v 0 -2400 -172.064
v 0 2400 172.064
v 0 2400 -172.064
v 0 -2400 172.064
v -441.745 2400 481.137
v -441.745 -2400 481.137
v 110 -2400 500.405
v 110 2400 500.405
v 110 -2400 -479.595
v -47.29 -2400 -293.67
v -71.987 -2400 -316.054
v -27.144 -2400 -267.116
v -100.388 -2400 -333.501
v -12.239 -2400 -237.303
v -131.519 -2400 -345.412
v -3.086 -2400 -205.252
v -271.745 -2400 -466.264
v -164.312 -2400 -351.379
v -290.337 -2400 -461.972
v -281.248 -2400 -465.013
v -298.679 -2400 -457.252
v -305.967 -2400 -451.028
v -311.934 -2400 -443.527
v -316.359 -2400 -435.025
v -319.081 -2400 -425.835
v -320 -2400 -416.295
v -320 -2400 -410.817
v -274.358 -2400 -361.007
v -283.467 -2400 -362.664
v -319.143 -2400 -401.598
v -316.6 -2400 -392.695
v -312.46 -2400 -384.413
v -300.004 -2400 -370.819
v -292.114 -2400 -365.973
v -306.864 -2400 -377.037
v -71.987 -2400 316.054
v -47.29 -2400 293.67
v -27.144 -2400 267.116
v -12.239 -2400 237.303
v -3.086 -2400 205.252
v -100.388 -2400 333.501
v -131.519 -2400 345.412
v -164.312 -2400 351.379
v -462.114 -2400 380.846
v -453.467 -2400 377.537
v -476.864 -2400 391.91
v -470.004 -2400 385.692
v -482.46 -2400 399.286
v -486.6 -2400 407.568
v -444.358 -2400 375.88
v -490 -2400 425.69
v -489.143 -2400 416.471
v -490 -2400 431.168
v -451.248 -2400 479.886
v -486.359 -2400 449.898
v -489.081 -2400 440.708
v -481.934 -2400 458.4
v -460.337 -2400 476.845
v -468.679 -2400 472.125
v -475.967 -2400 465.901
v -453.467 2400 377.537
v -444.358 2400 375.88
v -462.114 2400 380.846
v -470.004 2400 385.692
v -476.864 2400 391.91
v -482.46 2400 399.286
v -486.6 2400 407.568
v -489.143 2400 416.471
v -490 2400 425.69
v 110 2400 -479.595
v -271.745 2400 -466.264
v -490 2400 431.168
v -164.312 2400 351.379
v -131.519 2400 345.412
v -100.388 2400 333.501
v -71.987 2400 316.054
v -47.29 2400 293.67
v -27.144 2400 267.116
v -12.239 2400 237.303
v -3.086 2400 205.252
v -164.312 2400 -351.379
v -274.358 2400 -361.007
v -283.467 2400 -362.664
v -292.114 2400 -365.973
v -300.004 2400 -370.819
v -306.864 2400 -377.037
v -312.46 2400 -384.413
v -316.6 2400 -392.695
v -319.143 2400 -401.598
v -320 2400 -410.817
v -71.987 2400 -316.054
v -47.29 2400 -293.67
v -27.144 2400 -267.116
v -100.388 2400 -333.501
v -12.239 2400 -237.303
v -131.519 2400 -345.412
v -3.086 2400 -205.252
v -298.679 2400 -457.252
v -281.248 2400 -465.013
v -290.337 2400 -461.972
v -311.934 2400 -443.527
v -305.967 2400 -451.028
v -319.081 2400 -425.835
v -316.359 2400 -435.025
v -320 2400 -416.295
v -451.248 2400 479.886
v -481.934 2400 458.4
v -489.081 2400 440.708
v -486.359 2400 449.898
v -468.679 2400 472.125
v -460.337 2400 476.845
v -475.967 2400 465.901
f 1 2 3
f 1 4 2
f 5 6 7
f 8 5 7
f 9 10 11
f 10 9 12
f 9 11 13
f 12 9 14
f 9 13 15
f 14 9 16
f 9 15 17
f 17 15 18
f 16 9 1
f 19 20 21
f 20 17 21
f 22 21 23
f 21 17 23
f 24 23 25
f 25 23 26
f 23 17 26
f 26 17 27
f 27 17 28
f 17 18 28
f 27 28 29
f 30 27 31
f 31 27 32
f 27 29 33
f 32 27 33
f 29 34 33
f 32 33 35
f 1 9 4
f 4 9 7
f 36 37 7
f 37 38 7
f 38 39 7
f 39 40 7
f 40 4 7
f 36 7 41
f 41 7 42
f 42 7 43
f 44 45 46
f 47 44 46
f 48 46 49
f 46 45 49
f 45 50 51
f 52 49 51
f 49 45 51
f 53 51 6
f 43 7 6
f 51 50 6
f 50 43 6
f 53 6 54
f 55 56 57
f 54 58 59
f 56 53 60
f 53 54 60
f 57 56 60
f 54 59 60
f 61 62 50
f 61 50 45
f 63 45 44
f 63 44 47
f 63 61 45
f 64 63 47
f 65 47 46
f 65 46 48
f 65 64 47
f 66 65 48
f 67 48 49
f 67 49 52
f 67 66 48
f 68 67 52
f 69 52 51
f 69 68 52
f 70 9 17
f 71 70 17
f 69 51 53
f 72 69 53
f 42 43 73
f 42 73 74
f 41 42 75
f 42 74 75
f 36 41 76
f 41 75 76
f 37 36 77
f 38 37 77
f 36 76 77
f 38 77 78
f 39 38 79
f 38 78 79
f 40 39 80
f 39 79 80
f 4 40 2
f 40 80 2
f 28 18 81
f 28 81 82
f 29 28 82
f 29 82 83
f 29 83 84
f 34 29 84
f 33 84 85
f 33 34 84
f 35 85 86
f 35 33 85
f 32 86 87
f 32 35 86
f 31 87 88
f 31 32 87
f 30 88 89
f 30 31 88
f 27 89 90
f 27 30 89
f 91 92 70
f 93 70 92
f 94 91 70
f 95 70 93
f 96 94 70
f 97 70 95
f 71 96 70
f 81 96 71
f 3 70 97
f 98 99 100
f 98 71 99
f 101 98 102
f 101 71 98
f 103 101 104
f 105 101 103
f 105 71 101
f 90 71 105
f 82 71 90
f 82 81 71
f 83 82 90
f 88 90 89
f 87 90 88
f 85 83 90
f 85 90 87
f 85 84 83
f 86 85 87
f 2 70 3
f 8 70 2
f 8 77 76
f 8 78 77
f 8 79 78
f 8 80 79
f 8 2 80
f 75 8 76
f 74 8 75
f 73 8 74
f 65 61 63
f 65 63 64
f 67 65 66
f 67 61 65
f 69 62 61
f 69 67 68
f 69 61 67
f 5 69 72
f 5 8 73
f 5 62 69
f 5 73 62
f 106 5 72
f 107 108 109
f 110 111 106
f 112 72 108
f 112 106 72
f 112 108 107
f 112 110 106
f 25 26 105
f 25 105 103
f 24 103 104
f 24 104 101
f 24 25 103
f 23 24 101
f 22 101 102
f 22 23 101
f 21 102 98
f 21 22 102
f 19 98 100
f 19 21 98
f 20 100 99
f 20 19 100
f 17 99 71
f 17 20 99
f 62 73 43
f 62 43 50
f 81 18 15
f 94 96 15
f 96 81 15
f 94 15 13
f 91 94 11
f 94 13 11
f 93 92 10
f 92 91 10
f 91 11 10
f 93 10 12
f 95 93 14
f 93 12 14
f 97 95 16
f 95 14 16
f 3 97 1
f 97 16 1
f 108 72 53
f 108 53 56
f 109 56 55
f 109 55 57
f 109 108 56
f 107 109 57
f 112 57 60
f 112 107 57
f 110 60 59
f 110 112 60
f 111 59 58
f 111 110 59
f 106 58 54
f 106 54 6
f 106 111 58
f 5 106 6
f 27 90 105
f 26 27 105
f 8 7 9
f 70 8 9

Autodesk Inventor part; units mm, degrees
ref_plane "YZ Plane" through (0, 0, 0) normal (1, 0, 0) x (0, 1, 0)
ref_plane "XZ Plane" through (0, 0, 0) normal (0, 1, 0) x (-1, 0, 0)
ref_plane "XY Plane" through (0, 0, 0) normal (0, 0, 1) x (1, 0, 0)
sketch "Sketch1" plane through (0, 0, 0) normal (0, 1, 0) x (-1, 0, 0)
  line L0 (0, -675.5952) -> (0, 696.4048) construction
  line L1 (-230, 0) -> (610, 0) construction
  line L2 (0, 337.0036) -> (0, -337.0036)
  line L3 (0, -337.0036) -> (320, -365)
  line L4 (320, -365) -> (320, -464.5793)
  line L5 (0, 337.0036) -> (490, 379.8731)
  line L6 (490, 379.8731) -> (490, 479.4523)
  line L7 (490, 479.4523) -> (-110, 500.4048)
  line L8 (-110, 500.4048) -> (-110, -479.5952)
  line L9 (-110, -479.5952) -> (320, -464.5793)
  line L10 (320, -365) -> (320, 365) construction
  point P0 (0, 0)
  point P1 (320, -414.7896)
  dimension "d0" = 730
  dimension "d2" = 430
  dimension "d3" = 600
  dimension "d4" = 980
  dimension "d5" = 88
  dimension "d6" = 88
  dimension "d7" = 95
  dimension "d8" = 95
  dimension "d9" = 490
extrude "Extrusion1" add sketch "Sketch1" along normal mid plane 4800
fillet "Fillet1" radius 50 4 edges at (-320, 0, -464.5793) (-320, 0, -365) (-490, 0, 379.8731) (-490, 0, 479.4523)
fillet "Fillet2" radius 180 2 edges at (0, 0, 337.0036) (0, 0, -337.0036)
equation "\"d6\" = d5"
properties part number "Bunk 1"
